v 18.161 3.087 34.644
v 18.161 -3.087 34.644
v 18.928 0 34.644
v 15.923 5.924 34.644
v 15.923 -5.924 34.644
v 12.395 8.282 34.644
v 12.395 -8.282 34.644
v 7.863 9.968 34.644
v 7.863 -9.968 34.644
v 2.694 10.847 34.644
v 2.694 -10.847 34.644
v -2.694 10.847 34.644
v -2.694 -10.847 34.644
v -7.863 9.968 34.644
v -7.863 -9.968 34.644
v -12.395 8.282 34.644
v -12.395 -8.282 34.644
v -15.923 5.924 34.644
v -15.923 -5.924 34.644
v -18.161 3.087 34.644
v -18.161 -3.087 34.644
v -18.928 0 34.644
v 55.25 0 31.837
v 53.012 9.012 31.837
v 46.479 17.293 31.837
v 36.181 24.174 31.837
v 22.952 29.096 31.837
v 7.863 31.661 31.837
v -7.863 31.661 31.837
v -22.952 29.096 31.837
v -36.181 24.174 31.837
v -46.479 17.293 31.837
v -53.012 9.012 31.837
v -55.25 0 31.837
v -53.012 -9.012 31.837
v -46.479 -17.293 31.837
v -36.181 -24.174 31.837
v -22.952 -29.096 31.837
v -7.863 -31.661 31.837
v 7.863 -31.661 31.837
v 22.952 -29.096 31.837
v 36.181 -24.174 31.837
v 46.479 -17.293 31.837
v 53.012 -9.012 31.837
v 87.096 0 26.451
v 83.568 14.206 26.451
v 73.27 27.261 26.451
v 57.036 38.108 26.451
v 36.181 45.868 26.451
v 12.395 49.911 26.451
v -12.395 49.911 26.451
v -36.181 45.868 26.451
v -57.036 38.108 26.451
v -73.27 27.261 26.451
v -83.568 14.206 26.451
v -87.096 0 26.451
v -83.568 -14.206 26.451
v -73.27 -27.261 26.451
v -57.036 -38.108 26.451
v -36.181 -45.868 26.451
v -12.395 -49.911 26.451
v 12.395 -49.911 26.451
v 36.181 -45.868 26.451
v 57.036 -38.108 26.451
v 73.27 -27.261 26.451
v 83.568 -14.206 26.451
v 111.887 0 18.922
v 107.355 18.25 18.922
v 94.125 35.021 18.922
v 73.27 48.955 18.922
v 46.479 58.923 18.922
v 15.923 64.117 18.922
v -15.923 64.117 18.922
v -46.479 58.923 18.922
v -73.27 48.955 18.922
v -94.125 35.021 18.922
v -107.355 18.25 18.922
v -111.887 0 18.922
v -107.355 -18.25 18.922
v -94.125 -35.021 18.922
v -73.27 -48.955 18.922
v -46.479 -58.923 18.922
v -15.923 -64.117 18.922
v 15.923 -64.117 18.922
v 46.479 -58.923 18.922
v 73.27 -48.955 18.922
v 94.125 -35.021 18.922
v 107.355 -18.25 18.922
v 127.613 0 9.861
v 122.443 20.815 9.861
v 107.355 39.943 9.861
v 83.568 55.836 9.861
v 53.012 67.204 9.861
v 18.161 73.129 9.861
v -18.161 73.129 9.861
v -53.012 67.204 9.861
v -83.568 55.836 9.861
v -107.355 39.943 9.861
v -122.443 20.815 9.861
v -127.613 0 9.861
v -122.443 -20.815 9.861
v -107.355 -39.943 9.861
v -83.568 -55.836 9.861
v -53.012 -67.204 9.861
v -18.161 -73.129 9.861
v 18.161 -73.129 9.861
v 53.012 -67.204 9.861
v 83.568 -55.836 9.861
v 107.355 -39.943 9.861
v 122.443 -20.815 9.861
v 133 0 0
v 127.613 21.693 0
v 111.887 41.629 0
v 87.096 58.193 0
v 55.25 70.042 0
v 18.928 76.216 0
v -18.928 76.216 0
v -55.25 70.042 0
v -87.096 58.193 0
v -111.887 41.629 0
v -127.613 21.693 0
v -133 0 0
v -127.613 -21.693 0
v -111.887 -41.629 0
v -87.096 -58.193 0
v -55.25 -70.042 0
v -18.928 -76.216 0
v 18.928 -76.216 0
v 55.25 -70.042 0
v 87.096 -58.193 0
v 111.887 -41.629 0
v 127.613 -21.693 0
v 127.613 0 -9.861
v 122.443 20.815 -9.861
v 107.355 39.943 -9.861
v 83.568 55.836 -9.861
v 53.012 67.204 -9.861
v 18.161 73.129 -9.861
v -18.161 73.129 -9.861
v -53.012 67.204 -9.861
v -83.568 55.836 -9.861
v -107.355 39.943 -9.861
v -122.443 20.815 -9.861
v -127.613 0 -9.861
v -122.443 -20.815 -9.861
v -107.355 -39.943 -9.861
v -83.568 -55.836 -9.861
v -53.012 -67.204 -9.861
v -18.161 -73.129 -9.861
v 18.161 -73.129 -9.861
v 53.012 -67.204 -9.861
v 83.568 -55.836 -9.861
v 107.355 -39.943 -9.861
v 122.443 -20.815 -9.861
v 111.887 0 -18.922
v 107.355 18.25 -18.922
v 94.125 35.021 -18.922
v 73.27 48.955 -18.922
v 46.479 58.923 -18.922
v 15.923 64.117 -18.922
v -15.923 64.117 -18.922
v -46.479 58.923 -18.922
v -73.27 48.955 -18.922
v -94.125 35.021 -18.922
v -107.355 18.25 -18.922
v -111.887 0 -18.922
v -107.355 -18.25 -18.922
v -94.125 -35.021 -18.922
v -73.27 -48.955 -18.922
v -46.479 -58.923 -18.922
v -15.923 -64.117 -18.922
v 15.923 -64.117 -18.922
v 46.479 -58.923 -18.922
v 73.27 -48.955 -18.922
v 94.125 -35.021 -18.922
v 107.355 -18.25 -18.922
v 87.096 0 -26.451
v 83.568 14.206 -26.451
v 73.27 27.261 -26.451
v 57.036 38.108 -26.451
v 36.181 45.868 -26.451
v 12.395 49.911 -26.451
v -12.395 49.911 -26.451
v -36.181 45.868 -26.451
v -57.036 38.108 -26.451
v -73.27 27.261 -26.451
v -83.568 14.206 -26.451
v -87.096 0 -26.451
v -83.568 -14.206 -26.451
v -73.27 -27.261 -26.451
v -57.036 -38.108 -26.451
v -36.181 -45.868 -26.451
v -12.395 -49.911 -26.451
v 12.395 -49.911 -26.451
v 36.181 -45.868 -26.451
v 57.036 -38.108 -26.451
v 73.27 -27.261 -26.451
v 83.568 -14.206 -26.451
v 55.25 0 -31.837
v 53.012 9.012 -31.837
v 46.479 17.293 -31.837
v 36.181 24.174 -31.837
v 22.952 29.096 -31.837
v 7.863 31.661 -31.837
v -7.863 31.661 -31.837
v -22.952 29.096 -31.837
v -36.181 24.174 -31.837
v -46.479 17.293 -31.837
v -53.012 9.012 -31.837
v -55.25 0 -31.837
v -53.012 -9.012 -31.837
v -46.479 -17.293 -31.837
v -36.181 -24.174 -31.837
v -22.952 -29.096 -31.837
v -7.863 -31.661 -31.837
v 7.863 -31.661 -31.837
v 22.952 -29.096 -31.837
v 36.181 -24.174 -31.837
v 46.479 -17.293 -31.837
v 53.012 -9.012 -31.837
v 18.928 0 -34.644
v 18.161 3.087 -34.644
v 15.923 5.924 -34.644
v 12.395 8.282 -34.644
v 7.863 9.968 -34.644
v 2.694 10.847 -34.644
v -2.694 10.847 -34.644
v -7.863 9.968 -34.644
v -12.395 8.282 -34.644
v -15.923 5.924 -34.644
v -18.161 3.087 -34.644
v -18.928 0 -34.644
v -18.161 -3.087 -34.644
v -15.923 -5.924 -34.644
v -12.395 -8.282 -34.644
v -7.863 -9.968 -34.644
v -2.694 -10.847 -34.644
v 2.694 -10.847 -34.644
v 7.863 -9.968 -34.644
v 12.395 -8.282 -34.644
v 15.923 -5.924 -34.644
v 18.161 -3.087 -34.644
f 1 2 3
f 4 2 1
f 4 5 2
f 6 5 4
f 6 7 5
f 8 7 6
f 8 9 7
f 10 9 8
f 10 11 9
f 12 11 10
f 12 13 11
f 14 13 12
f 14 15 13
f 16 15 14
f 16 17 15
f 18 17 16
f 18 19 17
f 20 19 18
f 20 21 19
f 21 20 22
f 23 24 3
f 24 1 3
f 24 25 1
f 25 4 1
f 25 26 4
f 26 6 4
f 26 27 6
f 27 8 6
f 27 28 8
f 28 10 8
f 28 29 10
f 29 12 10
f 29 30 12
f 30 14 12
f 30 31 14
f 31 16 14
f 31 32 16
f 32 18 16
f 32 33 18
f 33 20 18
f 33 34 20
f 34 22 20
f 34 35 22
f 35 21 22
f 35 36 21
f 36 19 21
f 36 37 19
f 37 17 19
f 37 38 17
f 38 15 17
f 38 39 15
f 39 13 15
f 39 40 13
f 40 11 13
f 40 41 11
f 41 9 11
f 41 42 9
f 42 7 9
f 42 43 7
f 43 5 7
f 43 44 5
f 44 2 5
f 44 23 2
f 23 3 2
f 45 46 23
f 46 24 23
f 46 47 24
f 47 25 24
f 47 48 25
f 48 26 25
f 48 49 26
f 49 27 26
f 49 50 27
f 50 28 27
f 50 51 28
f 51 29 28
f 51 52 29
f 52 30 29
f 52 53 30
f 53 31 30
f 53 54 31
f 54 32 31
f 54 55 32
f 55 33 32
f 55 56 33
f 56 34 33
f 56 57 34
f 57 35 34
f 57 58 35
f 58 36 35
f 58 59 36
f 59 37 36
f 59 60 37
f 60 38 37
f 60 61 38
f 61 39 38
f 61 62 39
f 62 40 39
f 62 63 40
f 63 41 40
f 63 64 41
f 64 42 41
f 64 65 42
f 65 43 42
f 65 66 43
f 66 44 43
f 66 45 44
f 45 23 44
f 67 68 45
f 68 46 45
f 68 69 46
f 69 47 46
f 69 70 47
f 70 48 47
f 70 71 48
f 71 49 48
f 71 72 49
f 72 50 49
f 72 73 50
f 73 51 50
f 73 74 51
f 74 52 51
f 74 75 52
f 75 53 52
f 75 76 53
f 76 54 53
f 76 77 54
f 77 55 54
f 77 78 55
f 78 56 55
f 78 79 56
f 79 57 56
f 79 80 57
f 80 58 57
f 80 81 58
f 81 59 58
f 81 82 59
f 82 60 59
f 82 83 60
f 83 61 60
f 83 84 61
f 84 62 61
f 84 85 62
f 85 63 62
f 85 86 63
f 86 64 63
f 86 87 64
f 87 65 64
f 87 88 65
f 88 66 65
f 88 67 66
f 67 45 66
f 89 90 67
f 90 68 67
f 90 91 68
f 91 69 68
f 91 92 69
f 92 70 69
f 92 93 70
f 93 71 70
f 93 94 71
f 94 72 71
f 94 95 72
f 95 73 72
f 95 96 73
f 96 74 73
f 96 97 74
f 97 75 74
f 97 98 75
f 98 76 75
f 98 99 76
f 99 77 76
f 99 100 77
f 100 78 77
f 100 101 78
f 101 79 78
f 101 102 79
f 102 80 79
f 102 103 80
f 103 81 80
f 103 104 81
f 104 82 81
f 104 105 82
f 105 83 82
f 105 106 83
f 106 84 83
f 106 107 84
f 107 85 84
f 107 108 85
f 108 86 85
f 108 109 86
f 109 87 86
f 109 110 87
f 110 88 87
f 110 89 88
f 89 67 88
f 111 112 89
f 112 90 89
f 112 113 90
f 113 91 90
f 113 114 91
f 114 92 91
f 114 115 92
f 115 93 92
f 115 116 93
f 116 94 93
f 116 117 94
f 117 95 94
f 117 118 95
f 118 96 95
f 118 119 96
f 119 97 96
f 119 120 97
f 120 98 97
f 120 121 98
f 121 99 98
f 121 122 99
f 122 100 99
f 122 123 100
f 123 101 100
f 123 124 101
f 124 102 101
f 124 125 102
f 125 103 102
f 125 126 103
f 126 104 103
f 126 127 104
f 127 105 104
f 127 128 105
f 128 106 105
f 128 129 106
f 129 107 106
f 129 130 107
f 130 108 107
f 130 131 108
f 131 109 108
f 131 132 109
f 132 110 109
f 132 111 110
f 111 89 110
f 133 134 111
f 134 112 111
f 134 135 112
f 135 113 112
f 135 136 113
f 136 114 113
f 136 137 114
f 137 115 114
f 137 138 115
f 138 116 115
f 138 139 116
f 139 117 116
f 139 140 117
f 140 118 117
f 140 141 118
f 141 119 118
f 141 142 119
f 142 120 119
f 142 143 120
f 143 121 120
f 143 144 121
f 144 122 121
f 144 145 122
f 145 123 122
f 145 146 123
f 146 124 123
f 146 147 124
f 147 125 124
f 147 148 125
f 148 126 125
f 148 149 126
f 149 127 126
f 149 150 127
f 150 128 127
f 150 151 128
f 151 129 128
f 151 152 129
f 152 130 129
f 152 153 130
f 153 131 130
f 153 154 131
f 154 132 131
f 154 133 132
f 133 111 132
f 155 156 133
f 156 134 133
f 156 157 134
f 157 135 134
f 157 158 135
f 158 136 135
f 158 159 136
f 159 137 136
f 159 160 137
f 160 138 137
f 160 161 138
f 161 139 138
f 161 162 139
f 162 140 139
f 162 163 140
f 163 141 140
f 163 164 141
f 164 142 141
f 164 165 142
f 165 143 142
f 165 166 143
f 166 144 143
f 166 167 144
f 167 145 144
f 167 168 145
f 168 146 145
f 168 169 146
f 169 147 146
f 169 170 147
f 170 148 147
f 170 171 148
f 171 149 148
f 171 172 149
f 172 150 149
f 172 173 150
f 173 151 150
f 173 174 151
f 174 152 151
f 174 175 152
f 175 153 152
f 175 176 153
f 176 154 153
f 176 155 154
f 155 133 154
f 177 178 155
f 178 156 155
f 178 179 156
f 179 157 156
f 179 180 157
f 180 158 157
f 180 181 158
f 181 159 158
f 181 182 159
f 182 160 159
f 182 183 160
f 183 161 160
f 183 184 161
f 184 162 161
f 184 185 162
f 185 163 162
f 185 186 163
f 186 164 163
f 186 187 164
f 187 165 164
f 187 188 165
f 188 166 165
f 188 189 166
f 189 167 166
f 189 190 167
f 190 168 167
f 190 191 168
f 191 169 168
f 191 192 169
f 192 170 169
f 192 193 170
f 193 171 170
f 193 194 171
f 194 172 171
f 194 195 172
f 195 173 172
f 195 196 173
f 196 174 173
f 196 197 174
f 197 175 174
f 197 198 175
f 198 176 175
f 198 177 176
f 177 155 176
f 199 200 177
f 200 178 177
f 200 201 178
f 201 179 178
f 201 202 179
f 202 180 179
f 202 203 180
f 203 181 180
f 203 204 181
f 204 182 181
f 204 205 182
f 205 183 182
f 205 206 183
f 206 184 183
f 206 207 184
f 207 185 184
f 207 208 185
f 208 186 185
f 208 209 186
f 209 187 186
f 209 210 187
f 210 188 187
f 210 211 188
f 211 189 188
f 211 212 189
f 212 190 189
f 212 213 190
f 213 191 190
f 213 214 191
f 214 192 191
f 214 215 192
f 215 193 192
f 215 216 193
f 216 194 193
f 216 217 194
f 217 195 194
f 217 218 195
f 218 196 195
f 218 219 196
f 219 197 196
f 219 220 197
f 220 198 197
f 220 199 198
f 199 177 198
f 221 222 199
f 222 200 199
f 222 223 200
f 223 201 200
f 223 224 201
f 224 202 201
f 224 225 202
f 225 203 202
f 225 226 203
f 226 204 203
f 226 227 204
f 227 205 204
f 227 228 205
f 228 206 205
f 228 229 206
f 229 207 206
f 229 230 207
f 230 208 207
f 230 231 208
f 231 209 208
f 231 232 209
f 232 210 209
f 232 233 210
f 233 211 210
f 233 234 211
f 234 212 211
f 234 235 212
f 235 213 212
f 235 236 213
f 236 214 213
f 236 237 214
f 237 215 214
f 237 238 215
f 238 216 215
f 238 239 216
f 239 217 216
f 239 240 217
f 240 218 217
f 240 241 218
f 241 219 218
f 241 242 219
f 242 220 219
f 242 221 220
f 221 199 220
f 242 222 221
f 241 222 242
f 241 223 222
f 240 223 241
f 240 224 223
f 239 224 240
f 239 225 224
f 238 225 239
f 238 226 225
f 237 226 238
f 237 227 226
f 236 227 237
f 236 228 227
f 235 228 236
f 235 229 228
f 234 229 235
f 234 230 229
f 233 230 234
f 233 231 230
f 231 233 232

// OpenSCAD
// Generated by SolidPython 1.0.1 on 2020-07-29 00:46:54


scale(v = [19, 11, 5]) {
	sphere(r = 7);
}
/***********************************************
*********      SolidPython code:      **********
************************************************
 
# import packages: SolidPython
from solid import *
from solid.utils import *
from itertools import chain, combinations, permutations


class Resize:

    def __init__(self, scad_file):
        self.scad_file = scad_file
        #self.scad_file = import_scad(scad_file)
        # cone/cylinder param:
        self.r1 = 0
        self.r2 = 0
        self.h = 0
        # rectangular prism param:
        self.w = 0
        self.l = 0
        # ellipse param:
        self.r = 0

    # import OpenScad code (file name corresponds to shape)


    # classify shape + parameters
    def assign(self, param1, param2, param3):
        if self.scad_file == 'cone.scad':
            self.r1 = param1
            self.r2 = param2
            self.h = param3
        elif self.scad_file == 'cylinder.scad':
            self.r1 = param1
            self.r2 = param2
            self.h = param3
        elif self.scad_file == 'rectangularPrism.scad':
            self.h = param1
            self.l = param2
            self.w = param3
        else:
            self.r = param1
            self.h = param2

    # resize parameters
    def iterate(self):
        x = range(3, 20, 2)
        i = 1
        if self.scad_file == 'cone.scad':
            tempList = list(permutations(x, 2))
            for temp in tempList:
                param1 = temp[0]
                param2 = temp[1]
                filepath = 'produced_scad_files/' + 'cone' + str(param1) + '_' + str(param2) + '_' + '.scad'
                scad_render_to_file(cylinder(h=param1, r1=param2, r2=0), filepath)

        elif self.scad_file == 'cylinder.scad':
            tempList = list(permutations(x, 3))
            for temp in tempList:
                param1 = temp[0]
                param2 = temp[1]
                filepath = 'produced_scad_files/' + 'cylinder' + str(param1) + '_' + str(param2) + '_' + '.scad'
                scad_render_to_file(cylinder(h=param1, r1=param2, r2=param2), filepath)

        elif self.scad_file == 'rectangularPrism.scad':
            tempList = list(permutations(x, 3))
            for temp in tempList:
                param1 = temp[0]
                param2 = temp[1]
                param3 = temp[2]
                filepath = 'produced_scad_files/' + 'rectangularPrism' + str(param1) + '_' + str(param2) + '_' + str(
                    param3) + '.scad'
                scad_render_to_file(cube(size=(param1, param2, param3)), filepath)

        elif self.scad_file == 'ellipse.scad':
            tempList = list(permutations(x, 4))
            for temp in tempList:
                param1 = temp[0]
                param2 = temp[1]
                param3 = temp[2]
                param4 = temp[3]
                filepath = 'produced_scad_files/' + 'ellipse' + str(param1) + '_' + str(param2) + '_' + str(param3) + '_' + str(param4) + '.scad'
                scad_render_to_file(scale([param1, param2, param3])(sphere(r=param4)), filepath)

    def render_to_scadfile(self):
        scad_render_to_file(scad, 'example.scad') 
 
************************************************/
